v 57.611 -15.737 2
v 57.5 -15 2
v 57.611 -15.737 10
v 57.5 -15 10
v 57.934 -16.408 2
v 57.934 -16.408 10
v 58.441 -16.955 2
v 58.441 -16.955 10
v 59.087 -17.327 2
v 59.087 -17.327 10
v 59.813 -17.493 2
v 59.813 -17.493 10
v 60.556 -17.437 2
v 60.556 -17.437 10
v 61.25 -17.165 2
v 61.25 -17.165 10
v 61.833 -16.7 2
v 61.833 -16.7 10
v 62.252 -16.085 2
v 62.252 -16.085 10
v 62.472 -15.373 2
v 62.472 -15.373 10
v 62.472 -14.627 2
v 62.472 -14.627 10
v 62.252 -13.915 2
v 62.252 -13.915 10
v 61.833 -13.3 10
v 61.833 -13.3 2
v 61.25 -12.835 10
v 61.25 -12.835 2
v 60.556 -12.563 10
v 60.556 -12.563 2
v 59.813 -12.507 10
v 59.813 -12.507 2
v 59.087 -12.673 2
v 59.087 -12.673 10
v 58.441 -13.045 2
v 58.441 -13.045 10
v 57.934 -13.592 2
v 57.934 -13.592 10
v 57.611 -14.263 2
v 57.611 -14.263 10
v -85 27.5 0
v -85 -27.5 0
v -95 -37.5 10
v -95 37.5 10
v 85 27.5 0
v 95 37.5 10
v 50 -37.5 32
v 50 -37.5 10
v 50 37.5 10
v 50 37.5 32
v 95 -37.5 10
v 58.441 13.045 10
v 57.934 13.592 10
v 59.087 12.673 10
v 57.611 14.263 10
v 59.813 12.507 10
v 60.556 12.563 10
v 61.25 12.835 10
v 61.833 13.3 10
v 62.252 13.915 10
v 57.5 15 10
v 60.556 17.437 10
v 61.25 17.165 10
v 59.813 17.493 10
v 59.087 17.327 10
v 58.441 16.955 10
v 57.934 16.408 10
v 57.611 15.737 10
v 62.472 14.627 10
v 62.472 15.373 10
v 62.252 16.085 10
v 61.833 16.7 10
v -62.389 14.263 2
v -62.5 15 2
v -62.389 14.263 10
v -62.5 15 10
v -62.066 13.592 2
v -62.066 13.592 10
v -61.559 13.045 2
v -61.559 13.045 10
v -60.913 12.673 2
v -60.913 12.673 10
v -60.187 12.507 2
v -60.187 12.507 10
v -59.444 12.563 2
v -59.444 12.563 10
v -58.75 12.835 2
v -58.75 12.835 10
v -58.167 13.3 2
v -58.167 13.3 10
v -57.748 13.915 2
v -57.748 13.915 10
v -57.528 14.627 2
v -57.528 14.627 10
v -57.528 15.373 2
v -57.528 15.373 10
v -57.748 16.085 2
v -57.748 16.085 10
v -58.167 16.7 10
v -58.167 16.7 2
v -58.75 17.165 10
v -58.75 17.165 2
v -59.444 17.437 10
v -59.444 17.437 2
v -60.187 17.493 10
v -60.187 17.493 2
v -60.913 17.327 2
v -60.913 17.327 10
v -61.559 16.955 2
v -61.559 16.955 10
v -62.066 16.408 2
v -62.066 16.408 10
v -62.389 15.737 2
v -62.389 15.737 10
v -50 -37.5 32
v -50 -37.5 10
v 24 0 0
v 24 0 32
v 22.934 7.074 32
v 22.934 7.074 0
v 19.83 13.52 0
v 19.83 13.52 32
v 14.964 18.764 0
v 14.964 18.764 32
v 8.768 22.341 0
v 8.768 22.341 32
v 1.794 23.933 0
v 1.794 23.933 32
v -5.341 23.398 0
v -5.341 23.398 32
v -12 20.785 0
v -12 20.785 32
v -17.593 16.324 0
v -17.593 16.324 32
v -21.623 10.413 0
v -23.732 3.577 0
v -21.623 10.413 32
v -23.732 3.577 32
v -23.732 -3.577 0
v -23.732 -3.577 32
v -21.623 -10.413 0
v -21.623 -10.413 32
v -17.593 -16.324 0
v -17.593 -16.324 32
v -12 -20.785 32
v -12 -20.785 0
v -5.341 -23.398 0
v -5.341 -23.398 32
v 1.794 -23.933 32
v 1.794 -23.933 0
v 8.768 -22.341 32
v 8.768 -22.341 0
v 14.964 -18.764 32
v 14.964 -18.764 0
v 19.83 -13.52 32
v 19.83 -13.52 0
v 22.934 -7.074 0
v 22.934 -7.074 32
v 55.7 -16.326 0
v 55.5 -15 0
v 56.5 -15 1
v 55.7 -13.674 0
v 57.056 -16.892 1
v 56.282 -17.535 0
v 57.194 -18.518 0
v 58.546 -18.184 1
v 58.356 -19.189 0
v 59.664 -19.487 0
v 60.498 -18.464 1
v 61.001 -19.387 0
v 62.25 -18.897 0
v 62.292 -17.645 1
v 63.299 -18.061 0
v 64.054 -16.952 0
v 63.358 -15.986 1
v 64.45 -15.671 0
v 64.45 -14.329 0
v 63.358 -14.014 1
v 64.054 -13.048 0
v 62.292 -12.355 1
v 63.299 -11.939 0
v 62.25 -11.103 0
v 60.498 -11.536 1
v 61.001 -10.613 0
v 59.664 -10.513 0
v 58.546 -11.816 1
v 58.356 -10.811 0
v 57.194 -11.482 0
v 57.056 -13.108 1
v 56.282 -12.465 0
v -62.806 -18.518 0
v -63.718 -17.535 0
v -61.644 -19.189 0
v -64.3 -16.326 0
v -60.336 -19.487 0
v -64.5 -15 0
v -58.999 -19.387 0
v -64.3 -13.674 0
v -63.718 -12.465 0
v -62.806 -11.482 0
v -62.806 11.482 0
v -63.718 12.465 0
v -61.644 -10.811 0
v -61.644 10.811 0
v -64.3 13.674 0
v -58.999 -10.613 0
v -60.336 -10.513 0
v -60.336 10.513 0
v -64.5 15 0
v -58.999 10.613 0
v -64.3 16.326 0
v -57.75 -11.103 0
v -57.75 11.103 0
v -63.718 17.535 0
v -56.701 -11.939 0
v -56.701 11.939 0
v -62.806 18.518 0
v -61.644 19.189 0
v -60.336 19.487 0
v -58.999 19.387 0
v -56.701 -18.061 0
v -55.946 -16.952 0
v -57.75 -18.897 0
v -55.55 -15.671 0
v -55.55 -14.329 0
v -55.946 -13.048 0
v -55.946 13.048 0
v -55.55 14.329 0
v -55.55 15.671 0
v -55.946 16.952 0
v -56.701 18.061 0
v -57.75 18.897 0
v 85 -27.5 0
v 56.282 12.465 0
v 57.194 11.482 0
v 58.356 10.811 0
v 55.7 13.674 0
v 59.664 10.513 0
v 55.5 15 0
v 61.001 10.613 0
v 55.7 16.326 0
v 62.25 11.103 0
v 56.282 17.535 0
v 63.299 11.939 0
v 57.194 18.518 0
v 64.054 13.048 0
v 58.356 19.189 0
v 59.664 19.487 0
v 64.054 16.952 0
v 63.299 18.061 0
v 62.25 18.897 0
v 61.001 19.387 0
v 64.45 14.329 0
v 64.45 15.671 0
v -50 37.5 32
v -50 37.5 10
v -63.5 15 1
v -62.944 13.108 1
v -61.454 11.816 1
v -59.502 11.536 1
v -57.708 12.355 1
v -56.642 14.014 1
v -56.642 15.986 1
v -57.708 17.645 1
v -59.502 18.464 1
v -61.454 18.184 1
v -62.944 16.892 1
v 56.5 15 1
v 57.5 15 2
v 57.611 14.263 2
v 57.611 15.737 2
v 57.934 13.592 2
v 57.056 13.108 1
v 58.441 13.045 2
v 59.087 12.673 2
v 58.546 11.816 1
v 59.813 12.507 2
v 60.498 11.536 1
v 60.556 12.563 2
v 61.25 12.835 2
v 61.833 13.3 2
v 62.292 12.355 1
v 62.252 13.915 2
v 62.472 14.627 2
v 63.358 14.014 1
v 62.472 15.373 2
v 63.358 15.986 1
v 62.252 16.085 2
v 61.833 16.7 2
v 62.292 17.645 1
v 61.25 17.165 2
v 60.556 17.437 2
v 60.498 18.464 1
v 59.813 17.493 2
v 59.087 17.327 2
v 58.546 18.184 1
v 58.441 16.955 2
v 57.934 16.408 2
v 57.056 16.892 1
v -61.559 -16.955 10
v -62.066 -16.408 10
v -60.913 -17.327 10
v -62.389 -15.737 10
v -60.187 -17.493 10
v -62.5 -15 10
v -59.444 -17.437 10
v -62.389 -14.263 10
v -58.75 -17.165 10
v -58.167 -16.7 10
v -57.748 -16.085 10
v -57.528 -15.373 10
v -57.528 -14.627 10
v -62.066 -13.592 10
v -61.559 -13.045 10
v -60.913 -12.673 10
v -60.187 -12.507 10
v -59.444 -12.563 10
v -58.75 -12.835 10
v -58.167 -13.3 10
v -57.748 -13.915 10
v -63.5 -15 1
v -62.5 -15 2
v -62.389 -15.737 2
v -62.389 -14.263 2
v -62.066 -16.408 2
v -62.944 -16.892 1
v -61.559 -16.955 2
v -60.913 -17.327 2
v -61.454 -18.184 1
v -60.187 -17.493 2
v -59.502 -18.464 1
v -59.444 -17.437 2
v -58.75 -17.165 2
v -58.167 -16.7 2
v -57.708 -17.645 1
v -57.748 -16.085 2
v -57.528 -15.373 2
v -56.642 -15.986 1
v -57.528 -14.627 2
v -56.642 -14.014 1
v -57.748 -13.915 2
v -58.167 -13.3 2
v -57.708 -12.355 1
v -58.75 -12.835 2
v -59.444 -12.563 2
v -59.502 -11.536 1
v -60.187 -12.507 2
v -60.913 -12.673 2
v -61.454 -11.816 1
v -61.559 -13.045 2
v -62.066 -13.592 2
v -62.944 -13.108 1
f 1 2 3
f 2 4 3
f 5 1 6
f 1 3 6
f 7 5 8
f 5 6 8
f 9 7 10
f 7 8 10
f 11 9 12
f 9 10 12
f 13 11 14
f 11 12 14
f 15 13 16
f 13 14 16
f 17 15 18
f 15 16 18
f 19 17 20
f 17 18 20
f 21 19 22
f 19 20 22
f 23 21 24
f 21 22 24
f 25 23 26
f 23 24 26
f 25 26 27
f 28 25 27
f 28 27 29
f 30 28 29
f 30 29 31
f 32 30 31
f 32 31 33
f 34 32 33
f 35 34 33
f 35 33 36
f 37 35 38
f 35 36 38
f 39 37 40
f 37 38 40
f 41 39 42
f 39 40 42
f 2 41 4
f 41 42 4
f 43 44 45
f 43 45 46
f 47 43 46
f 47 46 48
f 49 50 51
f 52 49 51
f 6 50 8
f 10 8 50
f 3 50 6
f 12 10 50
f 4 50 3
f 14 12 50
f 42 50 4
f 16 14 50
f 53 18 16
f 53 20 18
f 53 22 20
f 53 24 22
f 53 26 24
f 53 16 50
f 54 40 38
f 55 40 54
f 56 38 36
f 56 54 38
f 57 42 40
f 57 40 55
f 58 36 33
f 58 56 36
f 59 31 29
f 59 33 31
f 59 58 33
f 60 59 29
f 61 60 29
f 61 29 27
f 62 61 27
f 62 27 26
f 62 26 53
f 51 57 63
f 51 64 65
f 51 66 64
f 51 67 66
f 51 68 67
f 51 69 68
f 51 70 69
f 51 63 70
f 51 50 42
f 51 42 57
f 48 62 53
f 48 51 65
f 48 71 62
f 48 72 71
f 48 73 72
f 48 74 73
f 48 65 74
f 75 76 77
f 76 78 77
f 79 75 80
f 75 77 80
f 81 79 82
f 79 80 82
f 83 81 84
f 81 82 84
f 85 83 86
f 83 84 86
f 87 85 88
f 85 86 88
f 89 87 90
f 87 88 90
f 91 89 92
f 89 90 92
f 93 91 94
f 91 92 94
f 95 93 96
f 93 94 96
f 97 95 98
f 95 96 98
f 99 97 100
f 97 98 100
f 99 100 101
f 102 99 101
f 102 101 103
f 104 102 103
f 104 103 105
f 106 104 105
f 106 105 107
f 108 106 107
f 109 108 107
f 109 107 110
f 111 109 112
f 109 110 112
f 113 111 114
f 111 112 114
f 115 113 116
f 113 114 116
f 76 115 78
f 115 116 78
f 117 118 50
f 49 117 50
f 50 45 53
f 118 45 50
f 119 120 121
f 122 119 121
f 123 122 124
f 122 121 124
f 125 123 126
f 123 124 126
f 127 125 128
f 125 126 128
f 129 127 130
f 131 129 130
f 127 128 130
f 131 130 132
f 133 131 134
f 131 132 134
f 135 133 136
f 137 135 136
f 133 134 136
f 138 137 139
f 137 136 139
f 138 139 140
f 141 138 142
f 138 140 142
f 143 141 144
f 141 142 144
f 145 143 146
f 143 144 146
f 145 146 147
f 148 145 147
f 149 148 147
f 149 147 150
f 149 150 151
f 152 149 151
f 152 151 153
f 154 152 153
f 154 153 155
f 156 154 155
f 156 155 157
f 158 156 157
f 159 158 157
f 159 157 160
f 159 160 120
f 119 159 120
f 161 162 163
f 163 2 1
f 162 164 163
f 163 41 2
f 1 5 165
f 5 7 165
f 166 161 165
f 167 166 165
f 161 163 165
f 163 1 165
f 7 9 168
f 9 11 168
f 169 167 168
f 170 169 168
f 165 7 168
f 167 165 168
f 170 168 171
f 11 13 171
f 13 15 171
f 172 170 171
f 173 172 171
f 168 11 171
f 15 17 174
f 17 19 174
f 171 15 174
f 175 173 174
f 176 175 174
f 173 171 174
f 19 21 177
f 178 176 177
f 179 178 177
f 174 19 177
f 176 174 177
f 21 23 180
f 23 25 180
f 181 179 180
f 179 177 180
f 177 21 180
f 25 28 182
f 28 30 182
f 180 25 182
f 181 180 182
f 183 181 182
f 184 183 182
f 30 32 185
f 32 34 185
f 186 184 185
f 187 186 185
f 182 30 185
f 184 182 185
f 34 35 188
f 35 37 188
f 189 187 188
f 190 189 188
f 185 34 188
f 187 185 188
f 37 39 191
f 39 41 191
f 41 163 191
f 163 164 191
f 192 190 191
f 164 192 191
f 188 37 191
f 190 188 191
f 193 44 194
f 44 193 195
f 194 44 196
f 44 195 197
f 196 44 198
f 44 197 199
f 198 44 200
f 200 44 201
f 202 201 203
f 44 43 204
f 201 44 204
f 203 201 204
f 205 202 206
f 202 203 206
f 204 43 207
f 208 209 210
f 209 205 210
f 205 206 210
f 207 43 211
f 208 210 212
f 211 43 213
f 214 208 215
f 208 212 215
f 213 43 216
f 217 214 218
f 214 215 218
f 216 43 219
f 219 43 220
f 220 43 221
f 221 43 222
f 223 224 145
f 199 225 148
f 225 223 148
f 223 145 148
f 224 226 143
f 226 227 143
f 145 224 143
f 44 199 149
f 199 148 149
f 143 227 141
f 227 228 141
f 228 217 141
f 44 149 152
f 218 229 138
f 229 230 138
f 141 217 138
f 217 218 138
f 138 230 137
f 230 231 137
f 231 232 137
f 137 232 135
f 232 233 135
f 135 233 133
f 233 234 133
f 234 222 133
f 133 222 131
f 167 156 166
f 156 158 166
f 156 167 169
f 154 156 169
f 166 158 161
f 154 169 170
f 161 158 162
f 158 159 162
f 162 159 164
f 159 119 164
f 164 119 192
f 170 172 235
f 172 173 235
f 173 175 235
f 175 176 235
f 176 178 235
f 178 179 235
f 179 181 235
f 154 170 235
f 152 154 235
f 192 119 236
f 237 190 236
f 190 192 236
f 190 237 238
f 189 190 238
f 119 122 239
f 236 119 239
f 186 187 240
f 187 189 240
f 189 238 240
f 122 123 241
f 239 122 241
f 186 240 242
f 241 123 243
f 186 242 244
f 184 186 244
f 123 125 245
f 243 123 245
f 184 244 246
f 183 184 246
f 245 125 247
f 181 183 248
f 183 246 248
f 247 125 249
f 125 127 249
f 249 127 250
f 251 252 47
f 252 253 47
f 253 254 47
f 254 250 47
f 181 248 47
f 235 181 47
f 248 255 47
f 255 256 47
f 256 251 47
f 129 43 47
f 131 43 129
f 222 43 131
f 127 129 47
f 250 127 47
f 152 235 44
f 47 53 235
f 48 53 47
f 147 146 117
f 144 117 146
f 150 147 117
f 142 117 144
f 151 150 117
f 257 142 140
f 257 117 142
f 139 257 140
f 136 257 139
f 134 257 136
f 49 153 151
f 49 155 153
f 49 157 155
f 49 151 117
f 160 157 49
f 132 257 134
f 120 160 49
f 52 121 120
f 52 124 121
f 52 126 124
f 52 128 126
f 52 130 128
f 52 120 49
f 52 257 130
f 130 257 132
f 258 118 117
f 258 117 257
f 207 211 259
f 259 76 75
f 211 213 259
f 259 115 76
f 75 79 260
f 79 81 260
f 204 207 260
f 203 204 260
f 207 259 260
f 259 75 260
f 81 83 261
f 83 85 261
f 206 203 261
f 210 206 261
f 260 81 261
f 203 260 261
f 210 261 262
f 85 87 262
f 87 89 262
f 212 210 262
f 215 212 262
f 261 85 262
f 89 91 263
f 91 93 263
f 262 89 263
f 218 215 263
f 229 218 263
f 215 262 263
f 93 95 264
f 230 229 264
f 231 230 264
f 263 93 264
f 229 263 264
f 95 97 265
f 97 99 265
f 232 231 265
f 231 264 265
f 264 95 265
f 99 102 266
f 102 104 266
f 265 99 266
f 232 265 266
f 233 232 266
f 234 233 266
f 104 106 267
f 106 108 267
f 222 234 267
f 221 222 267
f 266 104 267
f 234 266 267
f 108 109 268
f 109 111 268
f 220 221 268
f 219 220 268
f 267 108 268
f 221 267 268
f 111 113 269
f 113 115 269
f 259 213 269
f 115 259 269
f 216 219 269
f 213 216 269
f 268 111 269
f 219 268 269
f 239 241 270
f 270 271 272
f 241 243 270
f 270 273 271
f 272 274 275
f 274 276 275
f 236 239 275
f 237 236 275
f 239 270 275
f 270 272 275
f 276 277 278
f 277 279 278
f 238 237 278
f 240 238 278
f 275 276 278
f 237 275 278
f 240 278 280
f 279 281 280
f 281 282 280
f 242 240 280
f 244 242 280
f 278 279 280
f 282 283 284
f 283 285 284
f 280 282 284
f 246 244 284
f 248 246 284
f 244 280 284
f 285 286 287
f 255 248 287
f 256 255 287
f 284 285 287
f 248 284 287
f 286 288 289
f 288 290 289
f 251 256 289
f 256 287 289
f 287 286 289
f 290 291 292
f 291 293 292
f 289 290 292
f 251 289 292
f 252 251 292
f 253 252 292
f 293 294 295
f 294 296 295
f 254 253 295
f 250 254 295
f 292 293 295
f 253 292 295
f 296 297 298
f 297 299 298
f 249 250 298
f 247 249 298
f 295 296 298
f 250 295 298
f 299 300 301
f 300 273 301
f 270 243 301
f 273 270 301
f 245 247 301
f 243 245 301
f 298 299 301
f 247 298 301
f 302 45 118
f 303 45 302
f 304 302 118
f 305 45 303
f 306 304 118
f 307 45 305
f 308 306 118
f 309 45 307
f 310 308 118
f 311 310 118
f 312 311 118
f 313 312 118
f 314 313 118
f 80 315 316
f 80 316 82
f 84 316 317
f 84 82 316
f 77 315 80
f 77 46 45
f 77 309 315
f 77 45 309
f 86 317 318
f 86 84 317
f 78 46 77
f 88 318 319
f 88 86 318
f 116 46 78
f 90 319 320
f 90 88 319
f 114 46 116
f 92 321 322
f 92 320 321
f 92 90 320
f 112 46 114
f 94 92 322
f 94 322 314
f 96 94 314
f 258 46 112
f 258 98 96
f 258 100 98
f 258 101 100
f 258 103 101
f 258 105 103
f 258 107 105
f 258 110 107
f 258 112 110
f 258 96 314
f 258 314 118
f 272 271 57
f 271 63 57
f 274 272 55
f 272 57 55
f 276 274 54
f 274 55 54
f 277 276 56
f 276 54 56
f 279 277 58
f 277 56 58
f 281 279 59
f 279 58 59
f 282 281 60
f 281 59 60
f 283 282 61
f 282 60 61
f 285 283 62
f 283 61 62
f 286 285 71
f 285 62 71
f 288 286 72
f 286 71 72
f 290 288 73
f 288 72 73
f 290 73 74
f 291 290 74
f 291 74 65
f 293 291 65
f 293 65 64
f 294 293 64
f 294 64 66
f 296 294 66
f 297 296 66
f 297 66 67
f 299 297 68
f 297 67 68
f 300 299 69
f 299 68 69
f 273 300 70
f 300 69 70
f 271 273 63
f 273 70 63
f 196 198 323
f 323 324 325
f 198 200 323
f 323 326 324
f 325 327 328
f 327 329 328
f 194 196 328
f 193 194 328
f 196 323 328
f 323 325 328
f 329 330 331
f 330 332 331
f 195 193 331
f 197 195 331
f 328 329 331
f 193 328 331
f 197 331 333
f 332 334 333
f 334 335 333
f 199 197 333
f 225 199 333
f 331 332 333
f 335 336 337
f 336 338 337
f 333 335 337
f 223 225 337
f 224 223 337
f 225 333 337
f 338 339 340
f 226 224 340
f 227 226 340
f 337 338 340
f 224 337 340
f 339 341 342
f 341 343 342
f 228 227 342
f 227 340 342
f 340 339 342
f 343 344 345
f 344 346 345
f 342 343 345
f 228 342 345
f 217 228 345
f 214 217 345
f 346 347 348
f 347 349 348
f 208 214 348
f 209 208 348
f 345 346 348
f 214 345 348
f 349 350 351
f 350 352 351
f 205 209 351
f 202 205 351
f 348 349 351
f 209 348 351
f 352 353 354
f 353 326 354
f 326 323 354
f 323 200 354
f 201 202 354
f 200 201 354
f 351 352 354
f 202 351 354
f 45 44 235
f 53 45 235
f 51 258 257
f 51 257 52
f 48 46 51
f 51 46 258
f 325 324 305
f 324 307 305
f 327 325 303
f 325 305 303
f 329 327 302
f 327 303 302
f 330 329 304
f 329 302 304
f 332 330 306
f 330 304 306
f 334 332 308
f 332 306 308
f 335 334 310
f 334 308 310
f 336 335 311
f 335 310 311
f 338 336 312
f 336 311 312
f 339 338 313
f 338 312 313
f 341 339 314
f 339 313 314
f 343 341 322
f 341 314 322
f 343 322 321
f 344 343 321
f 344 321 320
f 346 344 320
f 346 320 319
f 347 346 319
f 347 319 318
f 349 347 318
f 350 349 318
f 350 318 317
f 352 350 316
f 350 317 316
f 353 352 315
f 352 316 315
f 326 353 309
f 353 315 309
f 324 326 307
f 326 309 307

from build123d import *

# Parameters (mm, degrees)
F0_W           = 190
F0_H           = 75
F1_DEPTH       = 10
F2_W           = 100
F2_H           = 75
F3_DEPTH       = 22
F4_R           = 24
F5_DEPTH       = 32.001
F6_SIZE        = 9.99999
F8_D           = 5
F8_CSINK_D     = 9
F8_CSINK_ANGLE = 90


# Not quite as in the source:
# - a fillet or chamfer is up to 0.001 mm smaller than in the source, because OpenCascade refuses the exact size


with BuildPart() as f1:
    # F0 (on Top) → F1 (new body)
    with BuildSketch(Plane.XY):
        Rectangle(F0_W, F0_H)
    extrude(amount=F1_DEPTH)

    # F2 (on face) → F3 (join)
    with BuildSketch(Plane.XY.offset(10)):
        Rectangle(F2_W, F2_H)
    extrude(amount=F3_DEPTH)

    # F4 (on face) → F5 (cut, through all)
    with BuildSketch(Plane.XY.offset(32)):
        Circle(F4_R)
    extrude(amount=-F5_DEPTH, mode=Mode.SUBTRACT)

    # F6 (size 10 in the source; OpenCascade refuses exactly that, so slightly less here)
    f6_edges = [f1.edges().sort_by_distance(p)[0] for p in [
        (95, 0, 0),
        (-95, 0, 0),
        (0, 37.5, 0),
        (0, -37.5, 0),
    ]]
    chamfer(f6_edges, length=F6_SIZE)

    # F8 (through all)
    with Locations(Plane(origin=(0, 0, 0), x_dir=(1, 0, 0), z_dir=(0, 0, -1))):
        with Locations((-60, 15), (-60, -15), (60, 15), (60, -15)):
            CounterSinkHole(F8_D / 2, F8_CSINK_D / 2, counter_sink_angle=F8_CSINK_ANGLE)


solid = f1.part
